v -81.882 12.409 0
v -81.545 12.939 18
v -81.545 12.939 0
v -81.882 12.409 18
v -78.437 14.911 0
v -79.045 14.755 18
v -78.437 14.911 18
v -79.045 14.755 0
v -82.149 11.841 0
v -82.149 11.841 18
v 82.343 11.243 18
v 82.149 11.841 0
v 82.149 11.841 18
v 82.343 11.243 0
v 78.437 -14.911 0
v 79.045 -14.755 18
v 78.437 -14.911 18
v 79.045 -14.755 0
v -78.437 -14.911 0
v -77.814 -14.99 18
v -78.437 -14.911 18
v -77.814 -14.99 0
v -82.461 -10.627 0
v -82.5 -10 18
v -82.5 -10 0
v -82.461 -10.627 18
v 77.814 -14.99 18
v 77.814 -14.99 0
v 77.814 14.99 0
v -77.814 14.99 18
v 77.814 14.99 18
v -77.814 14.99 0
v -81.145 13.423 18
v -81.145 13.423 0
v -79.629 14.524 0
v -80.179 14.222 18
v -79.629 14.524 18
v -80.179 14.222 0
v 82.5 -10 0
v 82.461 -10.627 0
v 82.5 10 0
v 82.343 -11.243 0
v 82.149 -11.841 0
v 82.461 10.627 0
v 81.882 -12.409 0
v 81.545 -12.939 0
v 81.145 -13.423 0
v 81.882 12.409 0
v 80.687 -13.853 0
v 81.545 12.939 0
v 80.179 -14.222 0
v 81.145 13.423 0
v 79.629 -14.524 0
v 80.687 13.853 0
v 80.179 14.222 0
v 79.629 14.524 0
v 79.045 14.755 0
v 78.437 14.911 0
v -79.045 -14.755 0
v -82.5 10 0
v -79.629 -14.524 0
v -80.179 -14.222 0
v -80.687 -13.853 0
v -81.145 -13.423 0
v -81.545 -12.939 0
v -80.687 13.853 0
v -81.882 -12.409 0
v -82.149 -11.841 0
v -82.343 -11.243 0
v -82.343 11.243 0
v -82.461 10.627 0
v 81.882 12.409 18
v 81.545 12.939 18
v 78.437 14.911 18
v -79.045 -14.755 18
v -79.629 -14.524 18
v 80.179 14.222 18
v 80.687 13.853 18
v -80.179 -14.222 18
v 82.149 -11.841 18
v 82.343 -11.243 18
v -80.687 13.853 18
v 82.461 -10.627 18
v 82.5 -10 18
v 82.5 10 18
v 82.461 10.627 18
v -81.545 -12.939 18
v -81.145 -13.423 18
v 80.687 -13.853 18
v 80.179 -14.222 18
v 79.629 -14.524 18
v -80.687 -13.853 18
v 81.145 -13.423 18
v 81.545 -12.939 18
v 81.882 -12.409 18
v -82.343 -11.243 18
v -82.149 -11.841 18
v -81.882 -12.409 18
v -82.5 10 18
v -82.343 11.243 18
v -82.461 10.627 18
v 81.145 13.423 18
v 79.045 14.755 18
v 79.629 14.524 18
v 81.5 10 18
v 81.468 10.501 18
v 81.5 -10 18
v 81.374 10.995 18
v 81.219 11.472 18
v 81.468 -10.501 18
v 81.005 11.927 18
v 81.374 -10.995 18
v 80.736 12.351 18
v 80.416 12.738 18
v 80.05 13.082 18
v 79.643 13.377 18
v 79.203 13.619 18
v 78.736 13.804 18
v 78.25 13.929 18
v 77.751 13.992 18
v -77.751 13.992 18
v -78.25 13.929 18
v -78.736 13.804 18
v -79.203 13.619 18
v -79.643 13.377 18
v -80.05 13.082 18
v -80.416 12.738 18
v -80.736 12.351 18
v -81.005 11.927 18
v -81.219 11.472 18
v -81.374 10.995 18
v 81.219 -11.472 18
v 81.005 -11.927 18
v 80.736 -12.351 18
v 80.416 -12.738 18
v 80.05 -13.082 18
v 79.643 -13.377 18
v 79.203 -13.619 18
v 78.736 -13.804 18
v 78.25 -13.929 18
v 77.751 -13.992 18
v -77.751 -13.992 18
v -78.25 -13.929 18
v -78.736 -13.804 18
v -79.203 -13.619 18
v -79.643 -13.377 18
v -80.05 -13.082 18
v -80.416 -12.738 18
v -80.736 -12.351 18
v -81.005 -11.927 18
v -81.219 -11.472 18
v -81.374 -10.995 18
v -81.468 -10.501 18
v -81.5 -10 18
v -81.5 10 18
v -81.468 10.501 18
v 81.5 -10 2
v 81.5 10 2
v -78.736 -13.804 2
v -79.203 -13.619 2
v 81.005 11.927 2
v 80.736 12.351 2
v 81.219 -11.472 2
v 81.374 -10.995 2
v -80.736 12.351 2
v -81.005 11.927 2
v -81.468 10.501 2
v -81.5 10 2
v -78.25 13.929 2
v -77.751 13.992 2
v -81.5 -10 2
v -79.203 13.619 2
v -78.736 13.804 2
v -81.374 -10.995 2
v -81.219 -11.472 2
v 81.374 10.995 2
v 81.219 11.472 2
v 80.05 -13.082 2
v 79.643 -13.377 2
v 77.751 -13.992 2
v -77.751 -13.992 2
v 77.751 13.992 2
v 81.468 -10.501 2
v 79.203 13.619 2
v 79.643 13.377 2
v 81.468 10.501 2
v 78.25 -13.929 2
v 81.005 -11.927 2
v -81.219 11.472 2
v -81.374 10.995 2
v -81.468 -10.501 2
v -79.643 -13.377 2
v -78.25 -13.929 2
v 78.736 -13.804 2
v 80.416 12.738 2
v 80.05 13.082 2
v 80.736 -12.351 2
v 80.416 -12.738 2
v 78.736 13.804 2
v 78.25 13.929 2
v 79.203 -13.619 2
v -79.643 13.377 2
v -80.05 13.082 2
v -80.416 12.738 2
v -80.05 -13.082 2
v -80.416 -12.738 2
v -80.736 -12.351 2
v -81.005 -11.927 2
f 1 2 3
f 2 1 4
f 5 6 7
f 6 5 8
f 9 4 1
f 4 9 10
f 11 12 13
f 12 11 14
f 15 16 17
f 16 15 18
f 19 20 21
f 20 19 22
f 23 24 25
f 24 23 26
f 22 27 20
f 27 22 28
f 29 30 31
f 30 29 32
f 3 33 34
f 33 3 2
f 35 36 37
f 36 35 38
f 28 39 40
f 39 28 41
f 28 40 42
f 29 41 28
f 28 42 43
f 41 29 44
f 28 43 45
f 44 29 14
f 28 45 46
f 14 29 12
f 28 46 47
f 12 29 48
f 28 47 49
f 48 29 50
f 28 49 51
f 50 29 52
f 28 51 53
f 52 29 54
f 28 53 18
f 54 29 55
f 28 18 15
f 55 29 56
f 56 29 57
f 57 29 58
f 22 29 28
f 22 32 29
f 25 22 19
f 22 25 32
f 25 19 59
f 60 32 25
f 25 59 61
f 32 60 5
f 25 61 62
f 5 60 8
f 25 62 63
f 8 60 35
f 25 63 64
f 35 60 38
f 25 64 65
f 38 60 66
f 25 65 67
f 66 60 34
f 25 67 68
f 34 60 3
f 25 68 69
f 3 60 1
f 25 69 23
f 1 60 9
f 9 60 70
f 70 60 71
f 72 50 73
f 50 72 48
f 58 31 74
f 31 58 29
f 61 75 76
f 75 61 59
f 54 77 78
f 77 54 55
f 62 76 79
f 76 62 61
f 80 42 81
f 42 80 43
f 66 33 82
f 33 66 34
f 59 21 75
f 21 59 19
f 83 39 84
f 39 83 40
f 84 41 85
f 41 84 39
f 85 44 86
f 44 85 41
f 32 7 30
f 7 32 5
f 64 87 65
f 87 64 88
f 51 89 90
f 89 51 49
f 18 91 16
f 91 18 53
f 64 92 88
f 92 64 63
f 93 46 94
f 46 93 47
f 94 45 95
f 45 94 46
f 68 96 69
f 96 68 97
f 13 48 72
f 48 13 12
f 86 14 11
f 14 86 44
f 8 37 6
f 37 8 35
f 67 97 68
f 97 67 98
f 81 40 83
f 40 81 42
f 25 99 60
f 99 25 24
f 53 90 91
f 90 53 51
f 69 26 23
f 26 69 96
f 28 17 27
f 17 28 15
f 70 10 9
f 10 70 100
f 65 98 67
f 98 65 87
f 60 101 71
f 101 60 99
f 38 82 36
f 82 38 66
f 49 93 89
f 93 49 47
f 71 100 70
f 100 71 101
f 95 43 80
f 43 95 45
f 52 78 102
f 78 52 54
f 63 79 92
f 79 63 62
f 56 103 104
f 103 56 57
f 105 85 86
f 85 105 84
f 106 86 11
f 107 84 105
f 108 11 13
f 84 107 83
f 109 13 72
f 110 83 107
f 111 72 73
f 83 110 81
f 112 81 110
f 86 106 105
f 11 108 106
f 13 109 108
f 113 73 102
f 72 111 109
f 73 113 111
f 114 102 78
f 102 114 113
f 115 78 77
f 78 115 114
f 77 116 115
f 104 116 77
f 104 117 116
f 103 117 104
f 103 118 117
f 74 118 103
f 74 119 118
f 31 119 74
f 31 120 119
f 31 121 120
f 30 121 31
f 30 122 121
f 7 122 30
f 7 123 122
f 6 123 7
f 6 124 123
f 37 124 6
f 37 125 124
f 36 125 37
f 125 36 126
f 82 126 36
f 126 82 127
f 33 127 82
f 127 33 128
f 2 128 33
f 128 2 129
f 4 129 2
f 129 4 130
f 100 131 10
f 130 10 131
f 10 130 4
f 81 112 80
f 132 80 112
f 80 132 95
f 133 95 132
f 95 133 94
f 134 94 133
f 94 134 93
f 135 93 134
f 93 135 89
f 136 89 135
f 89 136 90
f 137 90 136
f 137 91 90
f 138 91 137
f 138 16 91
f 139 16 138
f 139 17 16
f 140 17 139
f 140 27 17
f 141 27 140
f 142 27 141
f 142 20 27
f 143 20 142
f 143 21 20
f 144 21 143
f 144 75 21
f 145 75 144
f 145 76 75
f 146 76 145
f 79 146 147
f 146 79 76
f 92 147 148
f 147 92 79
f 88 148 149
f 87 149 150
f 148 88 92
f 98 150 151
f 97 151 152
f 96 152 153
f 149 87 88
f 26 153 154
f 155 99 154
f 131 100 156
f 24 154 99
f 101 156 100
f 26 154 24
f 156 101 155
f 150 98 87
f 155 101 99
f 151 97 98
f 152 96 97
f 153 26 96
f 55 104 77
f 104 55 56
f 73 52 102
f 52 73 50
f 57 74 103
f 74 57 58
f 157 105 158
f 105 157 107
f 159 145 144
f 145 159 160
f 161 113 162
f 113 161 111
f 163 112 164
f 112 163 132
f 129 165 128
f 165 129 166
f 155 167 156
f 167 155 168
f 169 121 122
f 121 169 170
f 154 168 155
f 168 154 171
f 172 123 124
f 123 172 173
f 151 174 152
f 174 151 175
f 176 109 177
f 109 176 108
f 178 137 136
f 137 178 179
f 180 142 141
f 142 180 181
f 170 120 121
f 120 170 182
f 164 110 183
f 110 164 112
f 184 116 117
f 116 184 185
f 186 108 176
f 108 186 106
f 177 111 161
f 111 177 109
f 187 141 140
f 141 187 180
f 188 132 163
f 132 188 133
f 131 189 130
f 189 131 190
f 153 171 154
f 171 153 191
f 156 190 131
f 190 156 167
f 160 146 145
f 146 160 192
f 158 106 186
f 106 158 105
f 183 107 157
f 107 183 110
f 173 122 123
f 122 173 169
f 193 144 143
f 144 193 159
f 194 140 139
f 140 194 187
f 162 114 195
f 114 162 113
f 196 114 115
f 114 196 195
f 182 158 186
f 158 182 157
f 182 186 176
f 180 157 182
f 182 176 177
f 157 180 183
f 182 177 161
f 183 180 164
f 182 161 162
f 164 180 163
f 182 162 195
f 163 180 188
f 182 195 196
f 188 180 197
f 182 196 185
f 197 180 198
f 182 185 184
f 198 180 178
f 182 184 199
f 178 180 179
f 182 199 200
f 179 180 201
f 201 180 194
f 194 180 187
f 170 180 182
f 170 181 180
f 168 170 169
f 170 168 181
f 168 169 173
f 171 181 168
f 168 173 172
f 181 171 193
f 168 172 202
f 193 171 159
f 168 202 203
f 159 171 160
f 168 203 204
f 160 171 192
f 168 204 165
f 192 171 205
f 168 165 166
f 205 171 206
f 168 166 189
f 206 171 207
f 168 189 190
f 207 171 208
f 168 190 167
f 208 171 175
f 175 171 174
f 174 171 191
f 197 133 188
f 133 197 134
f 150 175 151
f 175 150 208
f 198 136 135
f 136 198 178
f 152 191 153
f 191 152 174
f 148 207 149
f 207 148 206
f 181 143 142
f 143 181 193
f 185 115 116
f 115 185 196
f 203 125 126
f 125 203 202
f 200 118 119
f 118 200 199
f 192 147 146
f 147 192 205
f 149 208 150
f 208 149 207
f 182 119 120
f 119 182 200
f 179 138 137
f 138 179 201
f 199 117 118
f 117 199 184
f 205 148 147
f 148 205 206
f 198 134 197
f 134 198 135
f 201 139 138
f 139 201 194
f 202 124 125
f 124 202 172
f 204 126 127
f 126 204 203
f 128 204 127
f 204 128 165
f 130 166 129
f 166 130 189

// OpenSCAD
$fn = 50;


difference() {
	union() {
		hull() {
			translate(v = [-77.5000000000, 10.0000000000, 0]) {
				cylinder(h = 18, r = 5);
			}
			translate(v = [77.5000000000, 10.0000000000, 0]) {
				cylinder(h = 18, r = 5);
			}
			translate(v = [-77.5000000000, -10.0000000000, 0]) {
				cylinder(h = 18, r = 5);
			}
			translate(v = [77.5000000000, -10.0000000000, 0]) {
				cylinder(h = 18, r = 5);
			}
		}
	}
	union() {
		translate(v = [0, 0, 2]) {
			hull() {
				translate(v = [-77.5000000000, 10.0000000000, 0]) {
					cylinder(h = 16, r = 4);
				}
				translate(v = [77.5000000000, 10.0000000000, 0]) {
					cylinder(h = 16, r = 4);
				}
				translate(v = [-77.5000000000, -10.0000000000, 0]) {
					cylinder(h = 16, r = 4);
				}
				translate(v = [77.5000000000, -10.0000000000, 0]) {
					cylinder(h = 16, r = 4);
				}
			}
		}
	}
}
